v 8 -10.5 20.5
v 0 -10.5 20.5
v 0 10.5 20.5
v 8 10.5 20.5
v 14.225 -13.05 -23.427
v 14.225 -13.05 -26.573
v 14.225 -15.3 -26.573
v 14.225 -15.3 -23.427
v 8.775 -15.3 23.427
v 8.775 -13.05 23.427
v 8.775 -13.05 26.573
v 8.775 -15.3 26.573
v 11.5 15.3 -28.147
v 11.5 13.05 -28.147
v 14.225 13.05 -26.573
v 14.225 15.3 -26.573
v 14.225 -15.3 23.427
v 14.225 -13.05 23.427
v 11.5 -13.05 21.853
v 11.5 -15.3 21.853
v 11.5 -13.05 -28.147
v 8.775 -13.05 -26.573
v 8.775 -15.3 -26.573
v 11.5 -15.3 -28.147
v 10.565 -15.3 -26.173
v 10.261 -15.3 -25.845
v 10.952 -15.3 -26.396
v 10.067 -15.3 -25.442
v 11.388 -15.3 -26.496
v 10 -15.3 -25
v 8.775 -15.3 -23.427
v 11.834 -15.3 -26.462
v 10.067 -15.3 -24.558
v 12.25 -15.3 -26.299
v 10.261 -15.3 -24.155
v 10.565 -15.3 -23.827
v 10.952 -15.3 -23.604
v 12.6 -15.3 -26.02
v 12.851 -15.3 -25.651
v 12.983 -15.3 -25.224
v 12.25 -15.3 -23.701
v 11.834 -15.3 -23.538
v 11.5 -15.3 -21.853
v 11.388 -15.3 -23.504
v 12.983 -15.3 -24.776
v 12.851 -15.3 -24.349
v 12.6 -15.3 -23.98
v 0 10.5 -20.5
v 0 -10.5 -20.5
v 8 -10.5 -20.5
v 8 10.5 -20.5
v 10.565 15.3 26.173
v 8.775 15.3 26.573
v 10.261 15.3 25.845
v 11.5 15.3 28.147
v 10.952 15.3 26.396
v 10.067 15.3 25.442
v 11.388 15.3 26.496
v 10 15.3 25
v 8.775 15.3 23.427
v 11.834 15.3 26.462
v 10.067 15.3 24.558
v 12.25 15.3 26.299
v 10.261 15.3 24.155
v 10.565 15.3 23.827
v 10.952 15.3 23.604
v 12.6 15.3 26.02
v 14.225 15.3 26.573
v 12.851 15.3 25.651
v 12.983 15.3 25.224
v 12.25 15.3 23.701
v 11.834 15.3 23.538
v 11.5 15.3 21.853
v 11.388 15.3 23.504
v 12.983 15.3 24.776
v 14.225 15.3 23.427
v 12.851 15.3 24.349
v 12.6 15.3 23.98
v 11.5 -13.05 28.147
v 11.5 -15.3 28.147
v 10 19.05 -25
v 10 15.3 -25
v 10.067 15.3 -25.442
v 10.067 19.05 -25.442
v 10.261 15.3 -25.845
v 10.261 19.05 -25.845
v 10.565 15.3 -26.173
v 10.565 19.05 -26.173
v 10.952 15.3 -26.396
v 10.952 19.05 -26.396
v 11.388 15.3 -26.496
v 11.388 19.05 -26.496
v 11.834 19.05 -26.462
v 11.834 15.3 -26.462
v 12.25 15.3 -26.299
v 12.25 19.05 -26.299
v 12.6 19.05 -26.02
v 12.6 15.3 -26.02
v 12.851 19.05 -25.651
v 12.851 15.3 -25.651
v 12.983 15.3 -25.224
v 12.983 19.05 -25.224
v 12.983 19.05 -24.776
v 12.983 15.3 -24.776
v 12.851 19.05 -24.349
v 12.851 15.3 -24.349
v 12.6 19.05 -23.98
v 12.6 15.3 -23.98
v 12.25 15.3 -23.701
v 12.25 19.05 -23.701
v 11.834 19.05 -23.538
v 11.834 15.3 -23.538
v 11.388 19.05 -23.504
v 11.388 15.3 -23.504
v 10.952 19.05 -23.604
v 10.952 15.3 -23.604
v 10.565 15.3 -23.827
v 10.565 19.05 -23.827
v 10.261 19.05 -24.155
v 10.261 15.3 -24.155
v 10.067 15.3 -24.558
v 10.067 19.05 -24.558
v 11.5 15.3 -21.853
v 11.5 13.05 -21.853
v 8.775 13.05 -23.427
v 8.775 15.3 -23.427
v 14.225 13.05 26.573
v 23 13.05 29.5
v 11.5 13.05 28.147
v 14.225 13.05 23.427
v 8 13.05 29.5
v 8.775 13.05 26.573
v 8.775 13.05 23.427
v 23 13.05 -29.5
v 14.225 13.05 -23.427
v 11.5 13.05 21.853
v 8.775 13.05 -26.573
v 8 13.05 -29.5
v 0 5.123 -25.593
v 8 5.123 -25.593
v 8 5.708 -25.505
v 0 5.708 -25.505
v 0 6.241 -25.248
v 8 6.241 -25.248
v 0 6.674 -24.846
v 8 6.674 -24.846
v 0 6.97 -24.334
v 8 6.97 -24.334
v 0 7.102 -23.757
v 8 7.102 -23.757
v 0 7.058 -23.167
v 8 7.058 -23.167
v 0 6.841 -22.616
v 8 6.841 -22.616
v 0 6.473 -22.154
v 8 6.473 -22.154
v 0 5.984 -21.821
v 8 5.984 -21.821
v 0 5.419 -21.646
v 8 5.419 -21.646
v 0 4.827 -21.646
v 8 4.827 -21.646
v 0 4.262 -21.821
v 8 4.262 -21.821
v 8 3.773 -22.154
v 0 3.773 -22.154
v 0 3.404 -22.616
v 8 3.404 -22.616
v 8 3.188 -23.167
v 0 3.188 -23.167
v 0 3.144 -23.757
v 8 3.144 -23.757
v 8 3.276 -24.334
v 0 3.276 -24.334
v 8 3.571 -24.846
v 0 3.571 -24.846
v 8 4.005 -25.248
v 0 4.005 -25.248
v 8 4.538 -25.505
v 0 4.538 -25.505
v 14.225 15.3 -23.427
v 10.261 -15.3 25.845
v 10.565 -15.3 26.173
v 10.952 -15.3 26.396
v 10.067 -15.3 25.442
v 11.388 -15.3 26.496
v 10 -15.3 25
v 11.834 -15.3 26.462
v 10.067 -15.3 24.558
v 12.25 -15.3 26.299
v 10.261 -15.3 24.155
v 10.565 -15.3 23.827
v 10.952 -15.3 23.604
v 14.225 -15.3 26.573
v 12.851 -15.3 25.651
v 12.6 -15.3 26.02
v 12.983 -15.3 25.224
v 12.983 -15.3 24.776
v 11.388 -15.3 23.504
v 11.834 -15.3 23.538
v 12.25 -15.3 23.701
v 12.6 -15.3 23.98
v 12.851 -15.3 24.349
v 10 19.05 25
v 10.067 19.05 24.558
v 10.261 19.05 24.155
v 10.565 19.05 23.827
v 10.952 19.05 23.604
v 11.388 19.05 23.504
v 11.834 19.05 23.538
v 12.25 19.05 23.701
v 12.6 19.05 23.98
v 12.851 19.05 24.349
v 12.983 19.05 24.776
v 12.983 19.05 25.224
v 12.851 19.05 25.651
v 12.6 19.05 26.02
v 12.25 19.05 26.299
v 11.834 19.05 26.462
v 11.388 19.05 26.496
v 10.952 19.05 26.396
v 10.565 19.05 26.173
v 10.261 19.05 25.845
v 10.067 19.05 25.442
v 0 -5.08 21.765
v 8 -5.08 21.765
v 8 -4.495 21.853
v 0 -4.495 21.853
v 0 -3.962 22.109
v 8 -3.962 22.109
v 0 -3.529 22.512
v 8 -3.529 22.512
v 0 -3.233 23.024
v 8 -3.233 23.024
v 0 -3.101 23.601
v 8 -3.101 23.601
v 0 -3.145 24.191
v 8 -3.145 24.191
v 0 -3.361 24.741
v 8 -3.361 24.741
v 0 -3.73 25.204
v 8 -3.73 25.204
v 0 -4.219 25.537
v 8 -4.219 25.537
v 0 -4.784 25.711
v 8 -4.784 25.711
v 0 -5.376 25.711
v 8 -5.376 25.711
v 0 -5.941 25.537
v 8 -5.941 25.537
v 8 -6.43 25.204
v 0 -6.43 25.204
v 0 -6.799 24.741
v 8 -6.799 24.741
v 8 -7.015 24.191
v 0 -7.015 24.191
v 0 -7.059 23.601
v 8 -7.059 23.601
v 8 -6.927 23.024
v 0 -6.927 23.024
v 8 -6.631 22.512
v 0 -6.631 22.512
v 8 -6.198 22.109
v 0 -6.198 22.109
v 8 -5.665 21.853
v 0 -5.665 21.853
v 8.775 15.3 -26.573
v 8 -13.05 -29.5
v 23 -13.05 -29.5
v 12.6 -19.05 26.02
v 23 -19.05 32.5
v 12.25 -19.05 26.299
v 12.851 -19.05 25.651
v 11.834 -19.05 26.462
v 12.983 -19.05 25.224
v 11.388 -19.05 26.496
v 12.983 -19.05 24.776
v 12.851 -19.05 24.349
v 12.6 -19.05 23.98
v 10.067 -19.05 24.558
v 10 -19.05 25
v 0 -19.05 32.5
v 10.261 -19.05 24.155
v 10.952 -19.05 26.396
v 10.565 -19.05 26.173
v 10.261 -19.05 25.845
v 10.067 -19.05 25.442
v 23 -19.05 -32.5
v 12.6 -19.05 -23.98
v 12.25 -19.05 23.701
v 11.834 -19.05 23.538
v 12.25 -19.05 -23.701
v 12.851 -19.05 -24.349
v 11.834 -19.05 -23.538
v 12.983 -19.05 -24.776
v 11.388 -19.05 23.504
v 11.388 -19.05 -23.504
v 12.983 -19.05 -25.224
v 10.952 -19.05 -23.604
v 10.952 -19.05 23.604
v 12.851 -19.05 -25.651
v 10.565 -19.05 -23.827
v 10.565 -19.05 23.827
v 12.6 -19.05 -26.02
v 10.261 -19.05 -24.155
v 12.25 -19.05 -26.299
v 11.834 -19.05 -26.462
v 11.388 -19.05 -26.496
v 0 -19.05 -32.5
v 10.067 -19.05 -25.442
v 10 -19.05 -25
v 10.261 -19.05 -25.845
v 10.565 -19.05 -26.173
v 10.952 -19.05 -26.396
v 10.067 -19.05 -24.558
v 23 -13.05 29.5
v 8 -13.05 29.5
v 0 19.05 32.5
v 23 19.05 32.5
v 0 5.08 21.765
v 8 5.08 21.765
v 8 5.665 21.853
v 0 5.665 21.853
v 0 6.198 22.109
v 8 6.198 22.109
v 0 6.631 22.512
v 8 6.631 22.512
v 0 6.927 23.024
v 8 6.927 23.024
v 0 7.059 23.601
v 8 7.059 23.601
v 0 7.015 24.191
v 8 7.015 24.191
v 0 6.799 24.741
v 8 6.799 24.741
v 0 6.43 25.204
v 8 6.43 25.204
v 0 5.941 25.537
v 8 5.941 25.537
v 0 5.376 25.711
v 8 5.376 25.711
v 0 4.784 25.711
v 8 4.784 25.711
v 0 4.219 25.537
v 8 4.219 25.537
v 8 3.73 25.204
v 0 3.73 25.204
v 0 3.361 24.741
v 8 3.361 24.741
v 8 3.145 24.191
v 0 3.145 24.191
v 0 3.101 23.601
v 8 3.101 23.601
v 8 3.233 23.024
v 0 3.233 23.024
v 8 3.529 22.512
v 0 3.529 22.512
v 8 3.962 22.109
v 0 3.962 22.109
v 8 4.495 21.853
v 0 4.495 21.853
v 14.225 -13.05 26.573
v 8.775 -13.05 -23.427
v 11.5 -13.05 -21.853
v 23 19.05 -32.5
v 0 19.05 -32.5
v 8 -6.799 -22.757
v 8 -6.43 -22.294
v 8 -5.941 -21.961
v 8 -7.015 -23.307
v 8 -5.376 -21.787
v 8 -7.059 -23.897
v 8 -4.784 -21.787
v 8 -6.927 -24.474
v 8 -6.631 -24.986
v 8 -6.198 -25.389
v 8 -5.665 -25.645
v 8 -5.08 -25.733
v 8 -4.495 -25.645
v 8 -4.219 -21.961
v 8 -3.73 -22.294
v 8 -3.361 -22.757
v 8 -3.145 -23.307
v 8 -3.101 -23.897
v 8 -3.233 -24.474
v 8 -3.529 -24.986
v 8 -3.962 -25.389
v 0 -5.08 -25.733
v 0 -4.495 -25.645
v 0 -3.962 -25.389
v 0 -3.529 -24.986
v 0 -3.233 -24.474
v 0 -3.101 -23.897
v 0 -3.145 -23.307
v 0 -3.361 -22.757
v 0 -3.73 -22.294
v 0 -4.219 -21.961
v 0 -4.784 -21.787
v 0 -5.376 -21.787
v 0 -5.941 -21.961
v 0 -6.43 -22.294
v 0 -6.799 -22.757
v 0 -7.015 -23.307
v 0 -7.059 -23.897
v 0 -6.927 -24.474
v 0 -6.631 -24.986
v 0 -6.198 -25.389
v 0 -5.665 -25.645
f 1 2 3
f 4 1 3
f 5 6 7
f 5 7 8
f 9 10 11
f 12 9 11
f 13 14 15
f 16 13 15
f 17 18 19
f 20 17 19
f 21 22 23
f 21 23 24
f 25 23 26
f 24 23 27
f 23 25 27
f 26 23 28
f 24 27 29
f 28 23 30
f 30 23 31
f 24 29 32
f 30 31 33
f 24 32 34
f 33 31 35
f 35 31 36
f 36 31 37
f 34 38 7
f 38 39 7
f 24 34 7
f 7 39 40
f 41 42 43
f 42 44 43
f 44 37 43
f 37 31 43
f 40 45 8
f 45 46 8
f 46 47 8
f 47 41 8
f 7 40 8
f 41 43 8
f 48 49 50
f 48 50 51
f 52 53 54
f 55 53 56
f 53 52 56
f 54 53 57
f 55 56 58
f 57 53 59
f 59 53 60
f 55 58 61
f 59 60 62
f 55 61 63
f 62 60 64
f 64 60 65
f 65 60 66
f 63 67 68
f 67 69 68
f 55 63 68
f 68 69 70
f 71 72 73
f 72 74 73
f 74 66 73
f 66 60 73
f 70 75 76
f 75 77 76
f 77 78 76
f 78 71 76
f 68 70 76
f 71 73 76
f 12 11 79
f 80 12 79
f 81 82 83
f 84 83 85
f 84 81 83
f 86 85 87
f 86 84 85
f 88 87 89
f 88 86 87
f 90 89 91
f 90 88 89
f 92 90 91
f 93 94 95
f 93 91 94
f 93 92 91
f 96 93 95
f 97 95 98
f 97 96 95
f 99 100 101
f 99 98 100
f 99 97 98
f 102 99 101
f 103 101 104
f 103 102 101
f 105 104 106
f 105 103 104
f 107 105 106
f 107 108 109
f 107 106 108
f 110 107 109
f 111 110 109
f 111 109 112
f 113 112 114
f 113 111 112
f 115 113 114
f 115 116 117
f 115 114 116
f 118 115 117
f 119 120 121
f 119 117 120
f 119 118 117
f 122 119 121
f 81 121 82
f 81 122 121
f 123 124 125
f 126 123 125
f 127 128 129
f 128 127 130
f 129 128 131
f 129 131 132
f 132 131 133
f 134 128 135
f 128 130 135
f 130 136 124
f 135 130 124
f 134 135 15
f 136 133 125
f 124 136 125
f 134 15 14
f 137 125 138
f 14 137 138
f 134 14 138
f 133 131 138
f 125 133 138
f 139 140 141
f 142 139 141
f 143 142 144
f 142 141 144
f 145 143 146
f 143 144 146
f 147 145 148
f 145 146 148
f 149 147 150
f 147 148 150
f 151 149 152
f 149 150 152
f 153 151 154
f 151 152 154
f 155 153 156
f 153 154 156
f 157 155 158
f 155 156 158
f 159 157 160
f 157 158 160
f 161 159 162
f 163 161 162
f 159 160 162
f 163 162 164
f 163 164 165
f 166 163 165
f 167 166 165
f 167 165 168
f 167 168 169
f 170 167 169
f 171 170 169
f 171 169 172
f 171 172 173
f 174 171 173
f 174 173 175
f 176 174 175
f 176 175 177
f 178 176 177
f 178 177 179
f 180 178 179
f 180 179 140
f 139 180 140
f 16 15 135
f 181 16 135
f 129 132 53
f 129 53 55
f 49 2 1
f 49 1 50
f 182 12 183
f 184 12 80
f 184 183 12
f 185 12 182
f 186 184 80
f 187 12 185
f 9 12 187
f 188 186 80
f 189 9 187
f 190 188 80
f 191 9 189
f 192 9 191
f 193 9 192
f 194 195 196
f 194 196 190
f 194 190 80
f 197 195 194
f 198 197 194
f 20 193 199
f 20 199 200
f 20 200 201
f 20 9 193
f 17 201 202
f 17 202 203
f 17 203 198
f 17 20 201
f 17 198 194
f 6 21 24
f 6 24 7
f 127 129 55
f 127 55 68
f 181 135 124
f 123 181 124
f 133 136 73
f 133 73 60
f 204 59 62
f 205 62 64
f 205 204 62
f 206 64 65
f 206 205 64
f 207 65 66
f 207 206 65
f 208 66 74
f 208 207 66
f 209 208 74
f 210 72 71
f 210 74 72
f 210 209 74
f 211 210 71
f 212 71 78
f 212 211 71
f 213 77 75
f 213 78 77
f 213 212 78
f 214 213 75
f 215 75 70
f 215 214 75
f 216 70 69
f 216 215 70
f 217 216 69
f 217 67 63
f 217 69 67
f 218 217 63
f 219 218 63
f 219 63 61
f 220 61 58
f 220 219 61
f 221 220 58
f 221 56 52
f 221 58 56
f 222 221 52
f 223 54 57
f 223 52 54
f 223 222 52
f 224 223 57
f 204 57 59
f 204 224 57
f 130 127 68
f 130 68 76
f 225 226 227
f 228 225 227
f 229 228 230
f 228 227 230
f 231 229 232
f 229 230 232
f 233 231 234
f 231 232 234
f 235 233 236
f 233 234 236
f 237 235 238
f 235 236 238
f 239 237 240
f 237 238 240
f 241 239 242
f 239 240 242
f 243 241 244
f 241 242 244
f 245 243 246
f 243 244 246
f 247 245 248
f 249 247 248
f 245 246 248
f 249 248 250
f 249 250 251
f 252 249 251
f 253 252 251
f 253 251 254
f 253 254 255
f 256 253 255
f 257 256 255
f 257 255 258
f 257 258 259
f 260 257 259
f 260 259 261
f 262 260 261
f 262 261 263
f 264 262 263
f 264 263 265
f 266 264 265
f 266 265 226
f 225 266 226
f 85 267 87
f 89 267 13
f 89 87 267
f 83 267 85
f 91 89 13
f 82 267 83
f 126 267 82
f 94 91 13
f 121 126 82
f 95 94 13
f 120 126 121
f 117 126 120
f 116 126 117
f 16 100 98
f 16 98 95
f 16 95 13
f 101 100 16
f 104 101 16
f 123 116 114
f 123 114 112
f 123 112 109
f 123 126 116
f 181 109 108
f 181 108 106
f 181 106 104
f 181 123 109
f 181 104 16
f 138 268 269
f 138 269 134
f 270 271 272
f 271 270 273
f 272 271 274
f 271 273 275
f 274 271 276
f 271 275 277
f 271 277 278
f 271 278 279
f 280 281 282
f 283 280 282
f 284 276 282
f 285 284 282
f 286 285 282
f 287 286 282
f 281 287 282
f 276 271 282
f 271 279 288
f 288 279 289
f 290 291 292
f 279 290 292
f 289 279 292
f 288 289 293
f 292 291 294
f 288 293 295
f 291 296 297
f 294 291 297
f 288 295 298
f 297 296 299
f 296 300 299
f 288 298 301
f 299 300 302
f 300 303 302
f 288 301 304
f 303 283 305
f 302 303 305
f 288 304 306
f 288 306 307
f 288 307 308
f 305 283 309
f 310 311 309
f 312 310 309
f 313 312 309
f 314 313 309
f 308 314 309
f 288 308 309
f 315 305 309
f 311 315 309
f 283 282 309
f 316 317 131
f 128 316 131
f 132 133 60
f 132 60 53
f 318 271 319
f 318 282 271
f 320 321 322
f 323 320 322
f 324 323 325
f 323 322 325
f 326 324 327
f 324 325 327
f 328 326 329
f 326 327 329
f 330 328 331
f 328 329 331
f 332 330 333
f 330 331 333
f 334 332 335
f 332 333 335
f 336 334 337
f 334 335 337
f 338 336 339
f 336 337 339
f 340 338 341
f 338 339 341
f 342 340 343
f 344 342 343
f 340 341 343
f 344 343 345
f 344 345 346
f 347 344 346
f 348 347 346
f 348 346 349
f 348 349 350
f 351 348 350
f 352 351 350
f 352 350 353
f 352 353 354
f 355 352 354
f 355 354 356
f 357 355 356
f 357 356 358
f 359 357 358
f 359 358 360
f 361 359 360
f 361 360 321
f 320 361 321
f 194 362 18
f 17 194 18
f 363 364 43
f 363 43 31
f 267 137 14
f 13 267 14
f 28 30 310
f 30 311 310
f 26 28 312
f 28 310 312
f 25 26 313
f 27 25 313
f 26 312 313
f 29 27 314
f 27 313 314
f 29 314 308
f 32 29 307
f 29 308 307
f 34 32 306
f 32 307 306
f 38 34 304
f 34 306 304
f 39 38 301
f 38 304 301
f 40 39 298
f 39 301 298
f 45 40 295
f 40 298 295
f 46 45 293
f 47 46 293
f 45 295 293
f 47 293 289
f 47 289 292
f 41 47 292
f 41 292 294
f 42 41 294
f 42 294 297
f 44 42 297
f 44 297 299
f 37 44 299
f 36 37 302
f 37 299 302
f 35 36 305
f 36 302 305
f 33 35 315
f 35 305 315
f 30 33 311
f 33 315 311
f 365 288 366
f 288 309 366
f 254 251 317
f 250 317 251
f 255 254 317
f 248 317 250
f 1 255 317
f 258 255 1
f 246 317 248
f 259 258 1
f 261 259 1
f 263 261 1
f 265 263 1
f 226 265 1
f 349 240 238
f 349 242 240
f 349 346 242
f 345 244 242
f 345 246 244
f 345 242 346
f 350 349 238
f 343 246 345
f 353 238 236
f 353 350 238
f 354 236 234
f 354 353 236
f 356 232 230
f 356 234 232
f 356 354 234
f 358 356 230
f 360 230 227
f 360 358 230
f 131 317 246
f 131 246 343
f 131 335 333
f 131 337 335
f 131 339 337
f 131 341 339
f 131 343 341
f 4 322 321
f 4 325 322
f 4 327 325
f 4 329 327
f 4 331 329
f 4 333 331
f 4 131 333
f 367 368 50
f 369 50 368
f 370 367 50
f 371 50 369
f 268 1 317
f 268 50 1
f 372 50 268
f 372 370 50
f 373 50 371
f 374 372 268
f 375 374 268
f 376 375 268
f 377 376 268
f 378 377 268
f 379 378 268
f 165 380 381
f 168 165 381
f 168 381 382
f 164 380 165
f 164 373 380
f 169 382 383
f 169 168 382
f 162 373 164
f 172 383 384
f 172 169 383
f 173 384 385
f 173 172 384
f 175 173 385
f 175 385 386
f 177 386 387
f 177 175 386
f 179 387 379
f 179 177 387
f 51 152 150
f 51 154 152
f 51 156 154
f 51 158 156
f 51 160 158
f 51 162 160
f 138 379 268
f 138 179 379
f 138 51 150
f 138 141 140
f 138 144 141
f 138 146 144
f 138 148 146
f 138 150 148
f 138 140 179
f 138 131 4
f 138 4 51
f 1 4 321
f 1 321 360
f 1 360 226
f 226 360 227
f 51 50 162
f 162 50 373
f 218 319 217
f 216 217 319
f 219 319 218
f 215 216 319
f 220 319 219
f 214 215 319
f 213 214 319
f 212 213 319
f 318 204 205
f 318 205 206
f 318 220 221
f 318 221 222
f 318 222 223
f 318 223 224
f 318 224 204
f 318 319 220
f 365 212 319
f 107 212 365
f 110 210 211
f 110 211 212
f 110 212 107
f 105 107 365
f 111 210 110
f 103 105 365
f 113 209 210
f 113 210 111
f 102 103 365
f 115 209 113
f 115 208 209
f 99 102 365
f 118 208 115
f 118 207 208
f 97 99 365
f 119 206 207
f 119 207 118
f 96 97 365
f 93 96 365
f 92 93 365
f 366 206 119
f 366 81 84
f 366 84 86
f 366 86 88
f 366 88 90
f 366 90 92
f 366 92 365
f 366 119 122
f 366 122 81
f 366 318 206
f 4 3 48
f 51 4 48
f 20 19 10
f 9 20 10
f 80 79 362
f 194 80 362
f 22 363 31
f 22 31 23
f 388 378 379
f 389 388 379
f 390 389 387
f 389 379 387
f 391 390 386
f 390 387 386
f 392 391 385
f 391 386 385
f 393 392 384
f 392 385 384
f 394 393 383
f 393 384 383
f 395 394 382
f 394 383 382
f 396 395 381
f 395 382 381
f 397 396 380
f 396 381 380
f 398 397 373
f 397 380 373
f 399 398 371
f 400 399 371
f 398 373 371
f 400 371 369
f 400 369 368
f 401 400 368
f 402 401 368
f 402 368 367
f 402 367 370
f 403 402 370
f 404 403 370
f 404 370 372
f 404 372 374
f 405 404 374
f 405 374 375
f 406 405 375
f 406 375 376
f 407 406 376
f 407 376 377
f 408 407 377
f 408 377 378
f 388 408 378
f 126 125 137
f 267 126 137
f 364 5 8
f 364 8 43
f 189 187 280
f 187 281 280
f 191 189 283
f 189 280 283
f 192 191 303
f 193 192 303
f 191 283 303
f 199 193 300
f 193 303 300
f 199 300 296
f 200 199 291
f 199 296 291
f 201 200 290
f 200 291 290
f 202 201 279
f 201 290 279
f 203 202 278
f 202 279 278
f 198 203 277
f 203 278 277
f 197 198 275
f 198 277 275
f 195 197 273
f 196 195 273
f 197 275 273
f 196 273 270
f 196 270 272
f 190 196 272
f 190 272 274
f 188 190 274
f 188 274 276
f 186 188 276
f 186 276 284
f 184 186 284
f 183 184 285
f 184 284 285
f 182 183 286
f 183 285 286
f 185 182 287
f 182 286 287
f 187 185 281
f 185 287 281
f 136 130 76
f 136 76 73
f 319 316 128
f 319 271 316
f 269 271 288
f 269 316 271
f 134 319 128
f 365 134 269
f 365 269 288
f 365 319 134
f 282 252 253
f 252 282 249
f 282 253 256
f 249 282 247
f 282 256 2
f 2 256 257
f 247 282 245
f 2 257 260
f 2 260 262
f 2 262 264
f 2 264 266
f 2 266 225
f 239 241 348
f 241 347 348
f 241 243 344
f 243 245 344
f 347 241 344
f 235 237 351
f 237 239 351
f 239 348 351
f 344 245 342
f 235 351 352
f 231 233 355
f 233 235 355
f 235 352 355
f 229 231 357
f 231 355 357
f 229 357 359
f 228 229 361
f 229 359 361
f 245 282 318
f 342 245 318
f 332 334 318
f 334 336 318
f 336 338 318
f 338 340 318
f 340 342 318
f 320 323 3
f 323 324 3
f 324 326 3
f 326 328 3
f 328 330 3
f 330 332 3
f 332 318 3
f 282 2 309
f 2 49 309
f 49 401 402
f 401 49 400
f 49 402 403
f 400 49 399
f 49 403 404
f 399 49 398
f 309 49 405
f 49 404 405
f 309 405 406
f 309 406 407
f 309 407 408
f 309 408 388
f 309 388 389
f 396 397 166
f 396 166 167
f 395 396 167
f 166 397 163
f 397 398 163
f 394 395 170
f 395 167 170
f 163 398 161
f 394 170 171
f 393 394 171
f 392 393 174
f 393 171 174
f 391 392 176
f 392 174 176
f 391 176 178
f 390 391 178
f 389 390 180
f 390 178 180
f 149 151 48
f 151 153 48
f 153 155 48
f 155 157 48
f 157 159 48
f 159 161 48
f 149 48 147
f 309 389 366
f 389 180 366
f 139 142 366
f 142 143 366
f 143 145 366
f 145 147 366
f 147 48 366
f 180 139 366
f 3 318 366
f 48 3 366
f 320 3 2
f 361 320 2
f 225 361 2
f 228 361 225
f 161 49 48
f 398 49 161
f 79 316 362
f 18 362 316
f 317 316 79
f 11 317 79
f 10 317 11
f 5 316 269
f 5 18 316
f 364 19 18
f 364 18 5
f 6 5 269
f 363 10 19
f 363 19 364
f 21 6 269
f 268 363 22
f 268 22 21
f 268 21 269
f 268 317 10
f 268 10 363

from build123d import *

# Parameters (mm, degrees)
SKETCH1_W                                = 65
SKETCH1_H                                = 38.1
SKETCH1_W_2                              = 41
SKETCH1_H_2                              = 21
BOSS_EXTRUDE1_DEPTH                      = 8
SKETCH2_W                                = 65
SKETCH2_H                                = 38.1
SKETCH2_W_2                              = 59
SKETCH2_H_2                              = 26.1
BOSS_EXTRUDE2_DEPTH                      = 15
F_5_32_0_15625_DIAMETER_HOLE1_D          = 3.96875
F_3_0MM_DOWEL_HOLE1_D                    = 3
F_3_0MM_DOWEL_HOLE1_DEPTH                = 6
CUT_EXTRUDE1_DEPTH                       = 2.25
MIRROR2_AT_THE_SECOND_PLANE_COPY_1_DEPTH = 2.25


with BuildPart() as part:
    # Sketch1 → Boss-Extrude1 (new body)
    with BuildSketch(Plane(origin=(0, 0, 0), x_dir=(0, 0, -1), z_dir=(1, 0, 0))):
        Rectangle(SKETCH1_W, SKETCH1_H)
        Rectangle(SKETCH1_W_2, SKETCH1_H_2, mode=Mode.SUBTRACT)
    extrude(amount=BOSS_EXTRUDE1_DEPTH)

    # Sketch2 → Boss-Extrude2 (add)
    with BuildSketch(Plane(origin=(8, 0, 0), x_dir=(0, 0, -1), z_dir=(1, 0, 0))):
        Rectangle(SKETCH2_W, SKETCH2_H)
        Rectangle(SKETCH2_W_2, SKETCH2_H_2, mode=Mode.SUBTRACT)
    extrude(amount=BOSS_EXTRUDE2_DEPTH)

    # 5/32 (0.15625) Diameter Hole1 (through all)
    with Locations(Plane.ZY):
        with Locations((-23.60854322, 5.122882485), (-23.749, -5.08), (23.749, -5.08), (23.749, 5.08)):
            Hole(F_5_32_0_15625_DIAMETER_HOLE1_D / 2)

    # Ø3.0mm Dowel Hole1
    with Locations(Plane(origin=(0, -13.05, 0), x_dir=(1, 0, 0), z_dir=(0, 1, 0))):
        with Locations((11.5, 25), (11.5, -25)):
            f_3_0mm_dowel_hole1 = Hole(F_3_0MM_DOWEL_HOLE1_D / 2, depth=F_3_0MM_DOWEL_HOLE1_DEPTH)

    # Mirror1: Ø3.0mm Dowel Hole1 across plane
    add(f_3_0mm_dowel_hole1.mirror(Plane.ZX), mode=Mode.SUBTRACT)

    # Sketch7 → Cut-Extrude1 (cut)
    with BuildSketch(Plane(origin=(0, -13.05, 0), x_dir=(1, 0, 0), z_dir=(0, 1, 0))):
        Polygon((8.775, -26.573279484), (11.5, -28.146558967), (14.225, -26.573279484), (14.225, -23.426720516), (11.5, -21.853441033), (8.775, -23.426720516), align=None)
    cut_extrude1 = extrude(amount=-CUT_EXTRUDE1_DEPTH, mode=Mode.SUBTRACT)

    # Mirror2: Cut-Extrude1 across plane
    add(cut_extrude1.mirror(Plane.ZX), mode=Mode.SUBTRACT)

    # Mirror2 at the second plane: Cut-Extrude1 across plane
    add(cut_extrude1.mirror(Plane.XY), mode=Mode.SUBTRACT)

    # Mirror2 at the second plane copy 1 sketc → Mirror2 at the second plane copy 1 (cut)
    with BuildSketch(Plane.XZ.offset(-13.05)):
        Polygon((8.775, -26.573279484), (11.5, -28.146558967), (14.225, -26.573279484), (14.225, -23.426720516), (11.5, -21.853441033), (8.775, -23.426720516), align=None)
    extrude(amount=-MIRROR2_AT_THE_SECOND_PLANE_COPY_1_DEPTH, mode=Mode.SUBTRACT)


solid = part.part
